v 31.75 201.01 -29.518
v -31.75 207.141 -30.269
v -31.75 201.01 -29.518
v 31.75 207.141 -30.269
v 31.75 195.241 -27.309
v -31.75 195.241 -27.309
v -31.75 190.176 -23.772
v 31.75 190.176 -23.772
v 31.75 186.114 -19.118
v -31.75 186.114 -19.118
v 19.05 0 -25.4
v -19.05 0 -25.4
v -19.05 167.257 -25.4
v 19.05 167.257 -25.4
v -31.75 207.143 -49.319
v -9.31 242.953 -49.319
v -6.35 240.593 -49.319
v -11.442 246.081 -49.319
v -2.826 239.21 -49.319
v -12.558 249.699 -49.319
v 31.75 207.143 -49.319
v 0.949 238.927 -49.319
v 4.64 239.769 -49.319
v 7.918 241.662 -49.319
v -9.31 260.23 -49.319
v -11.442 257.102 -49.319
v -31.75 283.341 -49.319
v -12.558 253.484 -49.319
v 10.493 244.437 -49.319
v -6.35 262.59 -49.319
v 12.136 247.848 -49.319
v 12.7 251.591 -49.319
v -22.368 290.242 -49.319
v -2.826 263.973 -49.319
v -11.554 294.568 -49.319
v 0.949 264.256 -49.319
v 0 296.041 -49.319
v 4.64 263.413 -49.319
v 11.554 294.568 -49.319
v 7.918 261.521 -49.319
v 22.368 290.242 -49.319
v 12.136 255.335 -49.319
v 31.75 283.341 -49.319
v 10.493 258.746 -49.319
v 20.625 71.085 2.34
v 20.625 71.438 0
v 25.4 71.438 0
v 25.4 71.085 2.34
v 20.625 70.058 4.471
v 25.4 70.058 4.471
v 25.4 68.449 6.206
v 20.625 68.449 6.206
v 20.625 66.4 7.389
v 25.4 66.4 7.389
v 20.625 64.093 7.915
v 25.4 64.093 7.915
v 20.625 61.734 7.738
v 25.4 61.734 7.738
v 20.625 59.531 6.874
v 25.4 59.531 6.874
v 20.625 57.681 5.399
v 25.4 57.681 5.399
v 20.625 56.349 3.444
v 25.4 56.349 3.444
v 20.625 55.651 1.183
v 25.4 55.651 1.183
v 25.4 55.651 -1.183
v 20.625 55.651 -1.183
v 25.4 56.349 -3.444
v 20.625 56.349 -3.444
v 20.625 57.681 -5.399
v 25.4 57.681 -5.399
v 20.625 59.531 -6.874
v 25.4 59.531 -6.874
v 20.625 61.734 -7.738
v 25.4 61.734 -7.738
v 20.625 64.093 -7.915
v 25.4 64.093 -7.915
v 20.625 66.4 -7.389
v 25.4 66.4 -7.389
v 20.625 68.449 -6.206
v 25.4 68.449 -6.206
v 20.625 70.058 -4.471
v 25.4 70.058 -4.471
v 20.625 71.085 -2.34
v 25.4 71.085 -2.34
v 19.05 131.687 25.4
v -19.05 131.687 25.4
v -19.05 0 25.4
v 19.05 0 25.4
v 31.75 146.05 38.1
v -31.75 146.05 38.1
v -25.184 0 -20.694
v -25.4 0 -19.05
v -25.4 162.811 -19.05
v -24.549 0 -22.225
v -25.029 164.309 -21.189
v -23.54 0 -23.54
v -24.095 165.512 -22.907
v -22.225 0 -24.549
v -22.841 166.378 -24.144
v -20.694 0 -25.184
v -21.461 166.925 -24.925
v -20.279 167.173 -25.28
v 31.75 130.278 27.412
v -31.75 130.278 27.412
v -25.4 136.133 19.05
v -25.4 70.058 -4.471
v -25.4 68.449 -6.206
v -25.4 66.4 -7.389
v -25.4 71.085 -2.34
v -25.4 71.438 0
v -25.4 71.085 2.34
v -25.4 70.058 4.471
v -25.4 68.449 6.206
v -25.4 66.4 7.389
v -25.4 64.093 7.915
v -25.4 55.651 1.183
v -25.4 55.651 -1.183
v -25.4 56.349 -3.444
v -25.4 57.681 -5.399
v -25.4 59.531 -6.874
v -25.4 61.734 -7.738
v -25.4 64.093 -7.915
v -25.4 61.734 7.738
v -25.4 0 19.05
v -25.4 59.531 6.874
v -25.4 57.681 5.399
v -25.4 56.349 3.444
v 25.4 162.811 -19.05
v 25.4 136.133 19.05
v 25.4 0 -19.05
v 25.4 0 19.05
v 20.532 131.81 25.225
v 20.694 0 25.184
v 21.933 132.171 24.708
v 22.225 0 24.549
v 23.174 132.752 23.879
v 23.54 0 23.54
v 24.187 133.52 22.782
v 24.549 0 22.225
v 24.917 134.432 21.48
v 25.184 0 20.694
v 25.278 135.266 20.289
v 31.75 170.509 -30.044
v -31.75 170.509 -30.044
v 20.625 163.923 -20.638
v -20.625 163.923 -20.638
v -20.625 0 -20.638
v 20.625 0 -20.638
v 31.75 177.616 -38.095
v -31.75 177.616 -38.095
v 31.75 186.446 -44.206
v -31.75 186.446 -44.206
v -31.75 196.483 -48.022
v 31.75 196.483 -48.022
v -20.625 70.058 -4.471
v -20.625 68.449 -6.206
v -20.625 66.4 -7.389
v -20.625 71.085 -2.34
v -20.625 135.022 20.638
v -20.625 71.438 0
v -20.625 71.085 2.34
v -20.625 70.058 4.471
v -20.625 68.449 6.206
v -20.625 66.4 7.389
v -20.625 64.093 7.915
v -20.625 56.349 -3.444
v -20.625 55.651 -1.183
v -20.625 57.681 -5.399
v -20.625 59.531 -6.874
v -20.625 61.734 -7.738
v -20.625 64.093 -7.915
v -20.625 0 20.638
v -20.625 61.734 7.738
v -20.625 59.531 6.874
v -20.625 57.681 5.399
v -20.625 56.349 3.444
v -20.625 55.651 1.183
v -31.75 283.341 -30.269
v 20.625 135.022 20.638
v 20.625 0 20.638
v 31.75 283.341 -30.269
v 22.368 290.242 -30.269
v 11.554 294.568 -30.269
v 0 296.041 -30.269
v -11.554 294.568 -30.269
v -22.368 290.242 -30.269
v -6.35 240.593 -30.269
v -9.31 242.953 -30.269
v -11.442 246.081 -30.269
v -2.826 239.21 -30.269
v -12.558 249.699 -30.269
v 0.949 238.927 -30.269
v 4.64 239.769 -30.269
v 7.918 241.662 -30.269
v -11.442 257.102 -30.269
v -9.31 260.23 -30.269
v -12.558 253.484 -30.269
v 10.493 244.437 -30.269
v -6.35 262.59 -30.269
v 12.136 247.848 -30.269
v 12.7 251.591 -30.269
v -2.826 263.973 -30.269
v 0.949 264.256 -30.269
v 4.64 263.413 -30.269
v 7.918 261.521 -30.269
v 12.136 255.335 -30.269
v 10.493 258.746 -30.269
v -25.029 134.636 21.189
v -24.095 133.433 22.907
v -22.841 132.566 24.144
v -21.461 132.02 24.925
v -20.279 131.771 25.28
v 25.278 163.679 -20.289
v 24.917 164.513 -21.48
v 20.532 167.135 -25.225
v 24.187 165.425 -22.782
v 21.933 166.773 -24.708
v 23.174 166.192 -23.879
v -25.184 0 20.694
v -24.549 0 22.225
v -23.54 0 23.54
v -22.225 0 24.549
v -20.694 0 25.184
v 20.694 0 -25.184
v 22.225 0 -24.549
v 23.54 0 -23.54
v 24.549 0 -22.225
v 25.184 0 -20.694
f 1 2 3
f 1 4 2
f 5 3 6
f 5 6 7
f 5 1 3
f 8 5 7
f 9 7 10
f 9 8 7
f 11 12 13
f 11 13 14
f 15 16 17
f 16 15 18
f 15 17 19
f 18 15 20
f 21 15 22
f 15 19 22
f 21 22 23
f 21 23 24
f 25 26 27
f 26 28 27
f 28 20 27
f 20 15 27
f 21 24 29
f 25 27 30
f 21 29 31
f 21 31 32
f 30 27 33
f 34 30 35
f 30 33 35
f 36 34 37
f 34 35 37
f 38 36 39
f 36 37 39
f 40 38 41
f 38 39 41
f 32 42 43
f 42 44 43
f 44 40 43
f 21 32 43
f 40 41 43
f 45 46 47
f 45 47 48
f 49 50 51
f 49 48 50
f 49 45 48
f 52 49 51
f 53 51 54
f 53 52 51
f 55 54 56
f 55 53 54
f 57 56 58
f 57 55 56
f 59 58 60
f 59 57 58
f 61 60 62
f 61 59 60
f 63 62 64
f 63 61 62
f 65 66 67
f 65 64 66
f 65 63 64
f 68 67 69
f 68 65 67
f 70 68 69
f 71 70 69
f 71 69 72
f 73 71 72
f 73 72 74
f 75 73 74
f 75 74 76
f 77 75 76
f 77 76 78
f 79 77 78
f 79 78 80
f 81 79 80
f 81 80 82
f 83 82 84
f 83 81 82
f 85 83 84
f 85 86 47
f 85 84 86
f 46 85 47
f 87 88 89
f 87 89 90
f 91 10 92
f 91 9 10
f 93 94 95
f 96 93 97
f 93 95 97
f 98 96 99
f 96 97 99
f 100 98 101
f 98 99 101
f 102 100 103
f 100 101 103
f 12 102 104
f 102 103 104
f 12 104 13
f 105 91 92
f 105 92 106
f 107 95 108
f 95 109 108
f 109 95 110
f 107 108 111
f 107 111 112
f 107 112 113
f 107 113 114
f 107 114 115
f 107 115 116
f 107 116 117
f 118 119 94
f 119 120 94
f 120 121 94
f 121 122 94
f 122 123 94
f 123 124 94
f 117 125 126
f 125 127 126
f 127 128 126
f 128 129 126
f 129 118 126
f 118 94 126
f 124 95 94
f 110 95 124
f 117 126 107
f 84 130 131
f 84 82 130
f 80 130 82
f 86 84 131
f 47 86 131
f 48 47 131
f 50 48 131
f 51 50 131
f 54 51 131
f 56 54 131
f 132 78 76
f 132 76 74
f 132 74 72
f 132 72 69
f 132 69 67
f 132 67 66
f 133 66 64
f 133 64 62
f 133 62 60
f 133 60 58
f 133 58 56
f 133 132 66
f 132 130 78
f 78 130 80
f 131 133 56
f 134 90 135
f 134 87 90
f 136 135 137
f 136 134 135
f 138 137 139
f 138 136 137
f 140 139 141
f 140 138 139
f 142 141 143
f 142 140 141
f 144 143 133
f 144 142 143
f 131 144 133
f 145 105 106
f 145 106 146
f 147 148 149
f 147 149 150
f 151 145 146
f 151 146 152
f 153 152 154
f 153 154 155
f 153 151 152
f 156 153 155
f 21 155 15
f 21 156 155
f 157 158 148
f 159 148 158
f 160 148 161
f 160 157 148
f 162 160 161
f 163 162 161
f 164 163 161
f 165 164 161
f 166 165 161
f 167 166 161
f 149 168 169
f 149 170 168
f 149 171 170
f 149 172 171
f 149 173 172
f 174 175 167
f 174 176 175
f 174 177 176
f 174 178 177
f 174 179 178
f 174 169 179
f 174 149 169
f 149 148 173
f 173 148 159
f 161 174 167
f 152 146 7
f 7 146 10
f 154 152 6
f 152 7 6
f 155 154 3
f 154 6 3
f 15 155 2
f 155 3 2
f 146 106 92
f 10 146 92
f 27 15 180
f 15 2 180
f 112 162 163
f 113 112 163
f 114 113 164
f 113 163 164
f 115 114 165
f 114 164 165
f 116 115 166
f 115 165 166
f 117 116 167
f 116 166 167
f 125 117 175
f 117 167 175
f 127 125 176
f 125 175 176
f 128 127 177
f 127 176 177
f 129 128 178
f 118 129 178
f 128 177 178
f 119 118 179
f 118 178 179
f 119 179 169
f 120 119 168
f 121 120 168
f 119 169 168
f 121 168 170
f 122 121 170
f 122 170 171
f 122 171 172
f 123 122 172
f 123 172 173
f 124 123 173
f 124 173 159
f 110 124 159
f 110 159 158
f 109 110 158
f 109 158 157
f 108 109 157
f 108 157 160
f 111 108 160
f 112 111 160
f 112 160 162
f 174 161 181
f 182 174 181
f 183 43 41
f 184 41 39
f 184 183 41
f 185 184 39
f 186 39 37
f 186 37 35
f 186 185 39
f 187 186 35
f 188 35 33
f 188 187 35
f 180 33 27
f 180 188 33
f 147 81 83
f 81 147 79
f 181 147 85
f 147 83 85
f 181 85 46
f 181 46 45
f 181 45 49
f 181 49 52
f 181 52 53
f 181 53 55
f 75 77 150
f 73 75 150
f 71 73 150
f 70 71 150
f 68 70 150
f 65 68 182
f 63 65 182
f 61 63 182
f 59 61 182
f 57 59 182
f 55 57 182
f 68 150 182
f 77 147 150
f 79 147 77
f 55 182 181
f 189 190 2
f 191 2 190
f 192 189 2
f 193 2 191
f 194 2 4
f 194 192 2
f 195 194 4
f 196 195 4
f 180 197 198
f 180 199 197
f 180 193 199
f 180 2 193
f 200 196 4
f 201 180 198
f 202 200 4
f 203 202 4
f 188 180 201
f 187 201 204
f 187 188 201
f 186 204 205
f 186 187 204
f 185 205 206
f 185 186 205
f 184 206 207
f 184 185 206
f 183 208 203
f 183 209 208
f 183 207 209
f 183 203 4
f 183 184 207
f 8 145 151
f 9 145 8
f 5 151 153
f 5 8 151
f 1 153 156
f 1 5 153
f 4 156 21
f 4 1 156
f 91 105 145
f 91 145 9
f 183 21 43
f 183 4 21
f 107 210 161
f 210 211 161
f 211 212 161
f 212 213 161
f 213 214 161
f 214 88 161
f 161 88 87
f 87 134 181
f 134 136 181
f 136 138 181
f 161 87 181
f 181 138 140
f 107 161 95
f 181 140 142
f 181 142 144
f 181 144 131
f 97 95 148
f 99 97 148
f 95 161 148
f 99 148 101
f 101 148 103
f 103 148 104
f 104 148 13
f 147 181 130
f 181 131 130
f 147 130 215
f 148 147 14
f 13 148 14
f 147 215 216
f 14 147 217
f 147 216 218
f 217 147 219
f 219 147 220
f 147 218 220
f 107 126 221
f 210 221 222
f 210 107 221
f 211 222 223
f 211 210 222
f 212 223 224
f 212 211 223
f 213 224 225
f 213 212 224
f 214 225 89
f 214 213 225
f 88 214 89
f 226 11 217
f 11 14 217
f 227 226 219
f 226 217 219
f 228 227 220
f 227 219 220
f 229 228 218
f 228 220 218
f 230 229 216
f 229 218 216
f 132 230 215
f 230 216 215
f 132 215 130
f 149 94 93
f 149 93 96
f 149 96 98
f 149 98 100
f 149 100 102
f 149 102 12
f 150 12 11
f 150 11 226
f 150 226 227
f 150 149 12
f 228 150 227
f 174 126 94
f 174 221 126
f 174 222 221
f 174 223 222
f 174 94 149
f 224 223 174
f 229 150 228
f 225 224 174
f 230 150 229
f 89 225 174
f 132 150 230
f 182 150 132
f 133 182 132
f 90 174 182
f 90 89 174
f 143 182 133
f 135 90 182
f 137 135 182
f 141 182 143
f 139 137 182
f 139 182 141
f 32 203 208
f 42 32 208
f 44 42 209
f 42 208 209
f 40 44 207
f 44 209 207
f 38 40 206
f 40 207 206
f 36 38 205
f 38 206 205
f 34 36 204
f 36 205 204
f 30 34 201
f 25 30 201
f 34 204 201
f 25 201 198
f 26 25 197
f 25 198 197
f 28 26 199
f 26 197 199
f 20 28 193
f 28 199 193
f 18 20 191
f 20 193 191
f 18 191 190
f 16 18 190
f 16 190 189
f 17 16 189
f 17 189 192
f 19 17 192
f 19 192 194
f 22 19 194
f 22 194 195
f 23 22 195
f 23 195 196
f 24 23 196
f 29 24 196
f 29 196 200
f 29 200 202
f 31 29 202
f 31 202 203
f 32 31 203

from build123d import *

# Parameters (mm, degrees)
F2_DEPTH      = 31.75
F0_W          = 50.8
F0_H          = 50.8
F0_W_2        = 41.2496
F0_H_2        = 41.275
F5_R          = 7.9375
F6_DEPTH      = 31.751
F6_DEPTH_BACK = 31.751
F7_R          = 12.7
F8_DEPTH      = 19.051
F10_DEPTH     = 19.05
F11_R         = 6.35


with BuildPart() as f2:
    # F1 (on Right) → F2 (new body, symmetric)
    with BuildSketch(Plane.YZ):
        with BuildLine():
            Line((186.1143140791, -19.1177702936), (146.05, 38.1))
            Line((146.05, 38.1), (130.2778550255, 27.4122959508))
            Line((130.2778550255, 27.4122959508), (170.5094676354, -30.0444014061))
            ThreePointArc((170.5094676354, -30.0444014061), (186.4455404184, -44.2064382145), (207.1429241575, -49.3191682742))
            Line((207.1429241575, -49.3191682742), (283.3413761776, -49.3191682742))
            Line((283.3413761776, -49.3191682742), (283.3413761776, -30.2691682742))
            Line((283.3413761776, -30.2691682742), (207.1413761776, -30.2691682742))
            ThreePointArc((207.1413761776, -30.2691682742), (195.2408402925, -27.3088038695), (186.1143140791, -19.1177702936))
        make_face()
    extrude(amount=F2_DEPTH, both=True)


with BuildPart() as f3:
    # F0 (on Front) → F3 (new body, up to the next surface of F2)
    with BuildSketch(Plane.XZ):
        Rectangle(F0_W, F0_H)
        Rectangle(F0_W_2, F0_H_2, mode=Mode.SUBTRACT)
    extrude(until=Until.NEXT, target=f2.part, dir=(0, 1, 0))

    # F5 (on Right) → F6 (cut, two sides)
    with BuildSketch(Plane.YZ) as f6_sk:
        with Locations((63.5, 0)):
            Circle(F5_R)
    extrude(amount=-F6_DEPTH, mode=Mode.SUBTRACT)
    extrude(f6_sk.sketch, amount=F6_DEPTH_BACK, mode=Mode.SUBTRACT)

    # F11
    f11_edges = [f3.edges().sort_by_distance(p)[0] for p in [
        (25.4, 65.84344, 25.4),
        (-25.4, 65.84344, 25.4),
        (-25.4, 83.628711, -25.4),
        (25.4, 83.628711, -25.4),
    ]]
    fillet(f11_edges, radius=F11_R)


with BuildPart() as f2_1:
    add(f2.part)

    # F7 (on face) → F8 (cut, through all)
    with BuildSketch(Plane.XY.offset(-30.2691682742)):
        with Locations((0, 251.5913761776)):
            Circle(F7_R)
    extrude(amount=-F8_DEPTH, mode=Mode.SUBTRACT)

    # F9 (on face) → F10 (join)
    with BuildSketch(Plane.XY.offset(-30.2691682742)):
        with BuildLine():
            Line((-31.75, 283.3413761776), (31.75, 283.3413761776))
            ThreePointArc((31.75, 283.3413761776), (0, 296.0413761776), (-31.75, 283.3413761776))
        make_face()
    extrude(amount=-F10_DEPTH)


solid = Compound([f3.part, f2_1.part])
